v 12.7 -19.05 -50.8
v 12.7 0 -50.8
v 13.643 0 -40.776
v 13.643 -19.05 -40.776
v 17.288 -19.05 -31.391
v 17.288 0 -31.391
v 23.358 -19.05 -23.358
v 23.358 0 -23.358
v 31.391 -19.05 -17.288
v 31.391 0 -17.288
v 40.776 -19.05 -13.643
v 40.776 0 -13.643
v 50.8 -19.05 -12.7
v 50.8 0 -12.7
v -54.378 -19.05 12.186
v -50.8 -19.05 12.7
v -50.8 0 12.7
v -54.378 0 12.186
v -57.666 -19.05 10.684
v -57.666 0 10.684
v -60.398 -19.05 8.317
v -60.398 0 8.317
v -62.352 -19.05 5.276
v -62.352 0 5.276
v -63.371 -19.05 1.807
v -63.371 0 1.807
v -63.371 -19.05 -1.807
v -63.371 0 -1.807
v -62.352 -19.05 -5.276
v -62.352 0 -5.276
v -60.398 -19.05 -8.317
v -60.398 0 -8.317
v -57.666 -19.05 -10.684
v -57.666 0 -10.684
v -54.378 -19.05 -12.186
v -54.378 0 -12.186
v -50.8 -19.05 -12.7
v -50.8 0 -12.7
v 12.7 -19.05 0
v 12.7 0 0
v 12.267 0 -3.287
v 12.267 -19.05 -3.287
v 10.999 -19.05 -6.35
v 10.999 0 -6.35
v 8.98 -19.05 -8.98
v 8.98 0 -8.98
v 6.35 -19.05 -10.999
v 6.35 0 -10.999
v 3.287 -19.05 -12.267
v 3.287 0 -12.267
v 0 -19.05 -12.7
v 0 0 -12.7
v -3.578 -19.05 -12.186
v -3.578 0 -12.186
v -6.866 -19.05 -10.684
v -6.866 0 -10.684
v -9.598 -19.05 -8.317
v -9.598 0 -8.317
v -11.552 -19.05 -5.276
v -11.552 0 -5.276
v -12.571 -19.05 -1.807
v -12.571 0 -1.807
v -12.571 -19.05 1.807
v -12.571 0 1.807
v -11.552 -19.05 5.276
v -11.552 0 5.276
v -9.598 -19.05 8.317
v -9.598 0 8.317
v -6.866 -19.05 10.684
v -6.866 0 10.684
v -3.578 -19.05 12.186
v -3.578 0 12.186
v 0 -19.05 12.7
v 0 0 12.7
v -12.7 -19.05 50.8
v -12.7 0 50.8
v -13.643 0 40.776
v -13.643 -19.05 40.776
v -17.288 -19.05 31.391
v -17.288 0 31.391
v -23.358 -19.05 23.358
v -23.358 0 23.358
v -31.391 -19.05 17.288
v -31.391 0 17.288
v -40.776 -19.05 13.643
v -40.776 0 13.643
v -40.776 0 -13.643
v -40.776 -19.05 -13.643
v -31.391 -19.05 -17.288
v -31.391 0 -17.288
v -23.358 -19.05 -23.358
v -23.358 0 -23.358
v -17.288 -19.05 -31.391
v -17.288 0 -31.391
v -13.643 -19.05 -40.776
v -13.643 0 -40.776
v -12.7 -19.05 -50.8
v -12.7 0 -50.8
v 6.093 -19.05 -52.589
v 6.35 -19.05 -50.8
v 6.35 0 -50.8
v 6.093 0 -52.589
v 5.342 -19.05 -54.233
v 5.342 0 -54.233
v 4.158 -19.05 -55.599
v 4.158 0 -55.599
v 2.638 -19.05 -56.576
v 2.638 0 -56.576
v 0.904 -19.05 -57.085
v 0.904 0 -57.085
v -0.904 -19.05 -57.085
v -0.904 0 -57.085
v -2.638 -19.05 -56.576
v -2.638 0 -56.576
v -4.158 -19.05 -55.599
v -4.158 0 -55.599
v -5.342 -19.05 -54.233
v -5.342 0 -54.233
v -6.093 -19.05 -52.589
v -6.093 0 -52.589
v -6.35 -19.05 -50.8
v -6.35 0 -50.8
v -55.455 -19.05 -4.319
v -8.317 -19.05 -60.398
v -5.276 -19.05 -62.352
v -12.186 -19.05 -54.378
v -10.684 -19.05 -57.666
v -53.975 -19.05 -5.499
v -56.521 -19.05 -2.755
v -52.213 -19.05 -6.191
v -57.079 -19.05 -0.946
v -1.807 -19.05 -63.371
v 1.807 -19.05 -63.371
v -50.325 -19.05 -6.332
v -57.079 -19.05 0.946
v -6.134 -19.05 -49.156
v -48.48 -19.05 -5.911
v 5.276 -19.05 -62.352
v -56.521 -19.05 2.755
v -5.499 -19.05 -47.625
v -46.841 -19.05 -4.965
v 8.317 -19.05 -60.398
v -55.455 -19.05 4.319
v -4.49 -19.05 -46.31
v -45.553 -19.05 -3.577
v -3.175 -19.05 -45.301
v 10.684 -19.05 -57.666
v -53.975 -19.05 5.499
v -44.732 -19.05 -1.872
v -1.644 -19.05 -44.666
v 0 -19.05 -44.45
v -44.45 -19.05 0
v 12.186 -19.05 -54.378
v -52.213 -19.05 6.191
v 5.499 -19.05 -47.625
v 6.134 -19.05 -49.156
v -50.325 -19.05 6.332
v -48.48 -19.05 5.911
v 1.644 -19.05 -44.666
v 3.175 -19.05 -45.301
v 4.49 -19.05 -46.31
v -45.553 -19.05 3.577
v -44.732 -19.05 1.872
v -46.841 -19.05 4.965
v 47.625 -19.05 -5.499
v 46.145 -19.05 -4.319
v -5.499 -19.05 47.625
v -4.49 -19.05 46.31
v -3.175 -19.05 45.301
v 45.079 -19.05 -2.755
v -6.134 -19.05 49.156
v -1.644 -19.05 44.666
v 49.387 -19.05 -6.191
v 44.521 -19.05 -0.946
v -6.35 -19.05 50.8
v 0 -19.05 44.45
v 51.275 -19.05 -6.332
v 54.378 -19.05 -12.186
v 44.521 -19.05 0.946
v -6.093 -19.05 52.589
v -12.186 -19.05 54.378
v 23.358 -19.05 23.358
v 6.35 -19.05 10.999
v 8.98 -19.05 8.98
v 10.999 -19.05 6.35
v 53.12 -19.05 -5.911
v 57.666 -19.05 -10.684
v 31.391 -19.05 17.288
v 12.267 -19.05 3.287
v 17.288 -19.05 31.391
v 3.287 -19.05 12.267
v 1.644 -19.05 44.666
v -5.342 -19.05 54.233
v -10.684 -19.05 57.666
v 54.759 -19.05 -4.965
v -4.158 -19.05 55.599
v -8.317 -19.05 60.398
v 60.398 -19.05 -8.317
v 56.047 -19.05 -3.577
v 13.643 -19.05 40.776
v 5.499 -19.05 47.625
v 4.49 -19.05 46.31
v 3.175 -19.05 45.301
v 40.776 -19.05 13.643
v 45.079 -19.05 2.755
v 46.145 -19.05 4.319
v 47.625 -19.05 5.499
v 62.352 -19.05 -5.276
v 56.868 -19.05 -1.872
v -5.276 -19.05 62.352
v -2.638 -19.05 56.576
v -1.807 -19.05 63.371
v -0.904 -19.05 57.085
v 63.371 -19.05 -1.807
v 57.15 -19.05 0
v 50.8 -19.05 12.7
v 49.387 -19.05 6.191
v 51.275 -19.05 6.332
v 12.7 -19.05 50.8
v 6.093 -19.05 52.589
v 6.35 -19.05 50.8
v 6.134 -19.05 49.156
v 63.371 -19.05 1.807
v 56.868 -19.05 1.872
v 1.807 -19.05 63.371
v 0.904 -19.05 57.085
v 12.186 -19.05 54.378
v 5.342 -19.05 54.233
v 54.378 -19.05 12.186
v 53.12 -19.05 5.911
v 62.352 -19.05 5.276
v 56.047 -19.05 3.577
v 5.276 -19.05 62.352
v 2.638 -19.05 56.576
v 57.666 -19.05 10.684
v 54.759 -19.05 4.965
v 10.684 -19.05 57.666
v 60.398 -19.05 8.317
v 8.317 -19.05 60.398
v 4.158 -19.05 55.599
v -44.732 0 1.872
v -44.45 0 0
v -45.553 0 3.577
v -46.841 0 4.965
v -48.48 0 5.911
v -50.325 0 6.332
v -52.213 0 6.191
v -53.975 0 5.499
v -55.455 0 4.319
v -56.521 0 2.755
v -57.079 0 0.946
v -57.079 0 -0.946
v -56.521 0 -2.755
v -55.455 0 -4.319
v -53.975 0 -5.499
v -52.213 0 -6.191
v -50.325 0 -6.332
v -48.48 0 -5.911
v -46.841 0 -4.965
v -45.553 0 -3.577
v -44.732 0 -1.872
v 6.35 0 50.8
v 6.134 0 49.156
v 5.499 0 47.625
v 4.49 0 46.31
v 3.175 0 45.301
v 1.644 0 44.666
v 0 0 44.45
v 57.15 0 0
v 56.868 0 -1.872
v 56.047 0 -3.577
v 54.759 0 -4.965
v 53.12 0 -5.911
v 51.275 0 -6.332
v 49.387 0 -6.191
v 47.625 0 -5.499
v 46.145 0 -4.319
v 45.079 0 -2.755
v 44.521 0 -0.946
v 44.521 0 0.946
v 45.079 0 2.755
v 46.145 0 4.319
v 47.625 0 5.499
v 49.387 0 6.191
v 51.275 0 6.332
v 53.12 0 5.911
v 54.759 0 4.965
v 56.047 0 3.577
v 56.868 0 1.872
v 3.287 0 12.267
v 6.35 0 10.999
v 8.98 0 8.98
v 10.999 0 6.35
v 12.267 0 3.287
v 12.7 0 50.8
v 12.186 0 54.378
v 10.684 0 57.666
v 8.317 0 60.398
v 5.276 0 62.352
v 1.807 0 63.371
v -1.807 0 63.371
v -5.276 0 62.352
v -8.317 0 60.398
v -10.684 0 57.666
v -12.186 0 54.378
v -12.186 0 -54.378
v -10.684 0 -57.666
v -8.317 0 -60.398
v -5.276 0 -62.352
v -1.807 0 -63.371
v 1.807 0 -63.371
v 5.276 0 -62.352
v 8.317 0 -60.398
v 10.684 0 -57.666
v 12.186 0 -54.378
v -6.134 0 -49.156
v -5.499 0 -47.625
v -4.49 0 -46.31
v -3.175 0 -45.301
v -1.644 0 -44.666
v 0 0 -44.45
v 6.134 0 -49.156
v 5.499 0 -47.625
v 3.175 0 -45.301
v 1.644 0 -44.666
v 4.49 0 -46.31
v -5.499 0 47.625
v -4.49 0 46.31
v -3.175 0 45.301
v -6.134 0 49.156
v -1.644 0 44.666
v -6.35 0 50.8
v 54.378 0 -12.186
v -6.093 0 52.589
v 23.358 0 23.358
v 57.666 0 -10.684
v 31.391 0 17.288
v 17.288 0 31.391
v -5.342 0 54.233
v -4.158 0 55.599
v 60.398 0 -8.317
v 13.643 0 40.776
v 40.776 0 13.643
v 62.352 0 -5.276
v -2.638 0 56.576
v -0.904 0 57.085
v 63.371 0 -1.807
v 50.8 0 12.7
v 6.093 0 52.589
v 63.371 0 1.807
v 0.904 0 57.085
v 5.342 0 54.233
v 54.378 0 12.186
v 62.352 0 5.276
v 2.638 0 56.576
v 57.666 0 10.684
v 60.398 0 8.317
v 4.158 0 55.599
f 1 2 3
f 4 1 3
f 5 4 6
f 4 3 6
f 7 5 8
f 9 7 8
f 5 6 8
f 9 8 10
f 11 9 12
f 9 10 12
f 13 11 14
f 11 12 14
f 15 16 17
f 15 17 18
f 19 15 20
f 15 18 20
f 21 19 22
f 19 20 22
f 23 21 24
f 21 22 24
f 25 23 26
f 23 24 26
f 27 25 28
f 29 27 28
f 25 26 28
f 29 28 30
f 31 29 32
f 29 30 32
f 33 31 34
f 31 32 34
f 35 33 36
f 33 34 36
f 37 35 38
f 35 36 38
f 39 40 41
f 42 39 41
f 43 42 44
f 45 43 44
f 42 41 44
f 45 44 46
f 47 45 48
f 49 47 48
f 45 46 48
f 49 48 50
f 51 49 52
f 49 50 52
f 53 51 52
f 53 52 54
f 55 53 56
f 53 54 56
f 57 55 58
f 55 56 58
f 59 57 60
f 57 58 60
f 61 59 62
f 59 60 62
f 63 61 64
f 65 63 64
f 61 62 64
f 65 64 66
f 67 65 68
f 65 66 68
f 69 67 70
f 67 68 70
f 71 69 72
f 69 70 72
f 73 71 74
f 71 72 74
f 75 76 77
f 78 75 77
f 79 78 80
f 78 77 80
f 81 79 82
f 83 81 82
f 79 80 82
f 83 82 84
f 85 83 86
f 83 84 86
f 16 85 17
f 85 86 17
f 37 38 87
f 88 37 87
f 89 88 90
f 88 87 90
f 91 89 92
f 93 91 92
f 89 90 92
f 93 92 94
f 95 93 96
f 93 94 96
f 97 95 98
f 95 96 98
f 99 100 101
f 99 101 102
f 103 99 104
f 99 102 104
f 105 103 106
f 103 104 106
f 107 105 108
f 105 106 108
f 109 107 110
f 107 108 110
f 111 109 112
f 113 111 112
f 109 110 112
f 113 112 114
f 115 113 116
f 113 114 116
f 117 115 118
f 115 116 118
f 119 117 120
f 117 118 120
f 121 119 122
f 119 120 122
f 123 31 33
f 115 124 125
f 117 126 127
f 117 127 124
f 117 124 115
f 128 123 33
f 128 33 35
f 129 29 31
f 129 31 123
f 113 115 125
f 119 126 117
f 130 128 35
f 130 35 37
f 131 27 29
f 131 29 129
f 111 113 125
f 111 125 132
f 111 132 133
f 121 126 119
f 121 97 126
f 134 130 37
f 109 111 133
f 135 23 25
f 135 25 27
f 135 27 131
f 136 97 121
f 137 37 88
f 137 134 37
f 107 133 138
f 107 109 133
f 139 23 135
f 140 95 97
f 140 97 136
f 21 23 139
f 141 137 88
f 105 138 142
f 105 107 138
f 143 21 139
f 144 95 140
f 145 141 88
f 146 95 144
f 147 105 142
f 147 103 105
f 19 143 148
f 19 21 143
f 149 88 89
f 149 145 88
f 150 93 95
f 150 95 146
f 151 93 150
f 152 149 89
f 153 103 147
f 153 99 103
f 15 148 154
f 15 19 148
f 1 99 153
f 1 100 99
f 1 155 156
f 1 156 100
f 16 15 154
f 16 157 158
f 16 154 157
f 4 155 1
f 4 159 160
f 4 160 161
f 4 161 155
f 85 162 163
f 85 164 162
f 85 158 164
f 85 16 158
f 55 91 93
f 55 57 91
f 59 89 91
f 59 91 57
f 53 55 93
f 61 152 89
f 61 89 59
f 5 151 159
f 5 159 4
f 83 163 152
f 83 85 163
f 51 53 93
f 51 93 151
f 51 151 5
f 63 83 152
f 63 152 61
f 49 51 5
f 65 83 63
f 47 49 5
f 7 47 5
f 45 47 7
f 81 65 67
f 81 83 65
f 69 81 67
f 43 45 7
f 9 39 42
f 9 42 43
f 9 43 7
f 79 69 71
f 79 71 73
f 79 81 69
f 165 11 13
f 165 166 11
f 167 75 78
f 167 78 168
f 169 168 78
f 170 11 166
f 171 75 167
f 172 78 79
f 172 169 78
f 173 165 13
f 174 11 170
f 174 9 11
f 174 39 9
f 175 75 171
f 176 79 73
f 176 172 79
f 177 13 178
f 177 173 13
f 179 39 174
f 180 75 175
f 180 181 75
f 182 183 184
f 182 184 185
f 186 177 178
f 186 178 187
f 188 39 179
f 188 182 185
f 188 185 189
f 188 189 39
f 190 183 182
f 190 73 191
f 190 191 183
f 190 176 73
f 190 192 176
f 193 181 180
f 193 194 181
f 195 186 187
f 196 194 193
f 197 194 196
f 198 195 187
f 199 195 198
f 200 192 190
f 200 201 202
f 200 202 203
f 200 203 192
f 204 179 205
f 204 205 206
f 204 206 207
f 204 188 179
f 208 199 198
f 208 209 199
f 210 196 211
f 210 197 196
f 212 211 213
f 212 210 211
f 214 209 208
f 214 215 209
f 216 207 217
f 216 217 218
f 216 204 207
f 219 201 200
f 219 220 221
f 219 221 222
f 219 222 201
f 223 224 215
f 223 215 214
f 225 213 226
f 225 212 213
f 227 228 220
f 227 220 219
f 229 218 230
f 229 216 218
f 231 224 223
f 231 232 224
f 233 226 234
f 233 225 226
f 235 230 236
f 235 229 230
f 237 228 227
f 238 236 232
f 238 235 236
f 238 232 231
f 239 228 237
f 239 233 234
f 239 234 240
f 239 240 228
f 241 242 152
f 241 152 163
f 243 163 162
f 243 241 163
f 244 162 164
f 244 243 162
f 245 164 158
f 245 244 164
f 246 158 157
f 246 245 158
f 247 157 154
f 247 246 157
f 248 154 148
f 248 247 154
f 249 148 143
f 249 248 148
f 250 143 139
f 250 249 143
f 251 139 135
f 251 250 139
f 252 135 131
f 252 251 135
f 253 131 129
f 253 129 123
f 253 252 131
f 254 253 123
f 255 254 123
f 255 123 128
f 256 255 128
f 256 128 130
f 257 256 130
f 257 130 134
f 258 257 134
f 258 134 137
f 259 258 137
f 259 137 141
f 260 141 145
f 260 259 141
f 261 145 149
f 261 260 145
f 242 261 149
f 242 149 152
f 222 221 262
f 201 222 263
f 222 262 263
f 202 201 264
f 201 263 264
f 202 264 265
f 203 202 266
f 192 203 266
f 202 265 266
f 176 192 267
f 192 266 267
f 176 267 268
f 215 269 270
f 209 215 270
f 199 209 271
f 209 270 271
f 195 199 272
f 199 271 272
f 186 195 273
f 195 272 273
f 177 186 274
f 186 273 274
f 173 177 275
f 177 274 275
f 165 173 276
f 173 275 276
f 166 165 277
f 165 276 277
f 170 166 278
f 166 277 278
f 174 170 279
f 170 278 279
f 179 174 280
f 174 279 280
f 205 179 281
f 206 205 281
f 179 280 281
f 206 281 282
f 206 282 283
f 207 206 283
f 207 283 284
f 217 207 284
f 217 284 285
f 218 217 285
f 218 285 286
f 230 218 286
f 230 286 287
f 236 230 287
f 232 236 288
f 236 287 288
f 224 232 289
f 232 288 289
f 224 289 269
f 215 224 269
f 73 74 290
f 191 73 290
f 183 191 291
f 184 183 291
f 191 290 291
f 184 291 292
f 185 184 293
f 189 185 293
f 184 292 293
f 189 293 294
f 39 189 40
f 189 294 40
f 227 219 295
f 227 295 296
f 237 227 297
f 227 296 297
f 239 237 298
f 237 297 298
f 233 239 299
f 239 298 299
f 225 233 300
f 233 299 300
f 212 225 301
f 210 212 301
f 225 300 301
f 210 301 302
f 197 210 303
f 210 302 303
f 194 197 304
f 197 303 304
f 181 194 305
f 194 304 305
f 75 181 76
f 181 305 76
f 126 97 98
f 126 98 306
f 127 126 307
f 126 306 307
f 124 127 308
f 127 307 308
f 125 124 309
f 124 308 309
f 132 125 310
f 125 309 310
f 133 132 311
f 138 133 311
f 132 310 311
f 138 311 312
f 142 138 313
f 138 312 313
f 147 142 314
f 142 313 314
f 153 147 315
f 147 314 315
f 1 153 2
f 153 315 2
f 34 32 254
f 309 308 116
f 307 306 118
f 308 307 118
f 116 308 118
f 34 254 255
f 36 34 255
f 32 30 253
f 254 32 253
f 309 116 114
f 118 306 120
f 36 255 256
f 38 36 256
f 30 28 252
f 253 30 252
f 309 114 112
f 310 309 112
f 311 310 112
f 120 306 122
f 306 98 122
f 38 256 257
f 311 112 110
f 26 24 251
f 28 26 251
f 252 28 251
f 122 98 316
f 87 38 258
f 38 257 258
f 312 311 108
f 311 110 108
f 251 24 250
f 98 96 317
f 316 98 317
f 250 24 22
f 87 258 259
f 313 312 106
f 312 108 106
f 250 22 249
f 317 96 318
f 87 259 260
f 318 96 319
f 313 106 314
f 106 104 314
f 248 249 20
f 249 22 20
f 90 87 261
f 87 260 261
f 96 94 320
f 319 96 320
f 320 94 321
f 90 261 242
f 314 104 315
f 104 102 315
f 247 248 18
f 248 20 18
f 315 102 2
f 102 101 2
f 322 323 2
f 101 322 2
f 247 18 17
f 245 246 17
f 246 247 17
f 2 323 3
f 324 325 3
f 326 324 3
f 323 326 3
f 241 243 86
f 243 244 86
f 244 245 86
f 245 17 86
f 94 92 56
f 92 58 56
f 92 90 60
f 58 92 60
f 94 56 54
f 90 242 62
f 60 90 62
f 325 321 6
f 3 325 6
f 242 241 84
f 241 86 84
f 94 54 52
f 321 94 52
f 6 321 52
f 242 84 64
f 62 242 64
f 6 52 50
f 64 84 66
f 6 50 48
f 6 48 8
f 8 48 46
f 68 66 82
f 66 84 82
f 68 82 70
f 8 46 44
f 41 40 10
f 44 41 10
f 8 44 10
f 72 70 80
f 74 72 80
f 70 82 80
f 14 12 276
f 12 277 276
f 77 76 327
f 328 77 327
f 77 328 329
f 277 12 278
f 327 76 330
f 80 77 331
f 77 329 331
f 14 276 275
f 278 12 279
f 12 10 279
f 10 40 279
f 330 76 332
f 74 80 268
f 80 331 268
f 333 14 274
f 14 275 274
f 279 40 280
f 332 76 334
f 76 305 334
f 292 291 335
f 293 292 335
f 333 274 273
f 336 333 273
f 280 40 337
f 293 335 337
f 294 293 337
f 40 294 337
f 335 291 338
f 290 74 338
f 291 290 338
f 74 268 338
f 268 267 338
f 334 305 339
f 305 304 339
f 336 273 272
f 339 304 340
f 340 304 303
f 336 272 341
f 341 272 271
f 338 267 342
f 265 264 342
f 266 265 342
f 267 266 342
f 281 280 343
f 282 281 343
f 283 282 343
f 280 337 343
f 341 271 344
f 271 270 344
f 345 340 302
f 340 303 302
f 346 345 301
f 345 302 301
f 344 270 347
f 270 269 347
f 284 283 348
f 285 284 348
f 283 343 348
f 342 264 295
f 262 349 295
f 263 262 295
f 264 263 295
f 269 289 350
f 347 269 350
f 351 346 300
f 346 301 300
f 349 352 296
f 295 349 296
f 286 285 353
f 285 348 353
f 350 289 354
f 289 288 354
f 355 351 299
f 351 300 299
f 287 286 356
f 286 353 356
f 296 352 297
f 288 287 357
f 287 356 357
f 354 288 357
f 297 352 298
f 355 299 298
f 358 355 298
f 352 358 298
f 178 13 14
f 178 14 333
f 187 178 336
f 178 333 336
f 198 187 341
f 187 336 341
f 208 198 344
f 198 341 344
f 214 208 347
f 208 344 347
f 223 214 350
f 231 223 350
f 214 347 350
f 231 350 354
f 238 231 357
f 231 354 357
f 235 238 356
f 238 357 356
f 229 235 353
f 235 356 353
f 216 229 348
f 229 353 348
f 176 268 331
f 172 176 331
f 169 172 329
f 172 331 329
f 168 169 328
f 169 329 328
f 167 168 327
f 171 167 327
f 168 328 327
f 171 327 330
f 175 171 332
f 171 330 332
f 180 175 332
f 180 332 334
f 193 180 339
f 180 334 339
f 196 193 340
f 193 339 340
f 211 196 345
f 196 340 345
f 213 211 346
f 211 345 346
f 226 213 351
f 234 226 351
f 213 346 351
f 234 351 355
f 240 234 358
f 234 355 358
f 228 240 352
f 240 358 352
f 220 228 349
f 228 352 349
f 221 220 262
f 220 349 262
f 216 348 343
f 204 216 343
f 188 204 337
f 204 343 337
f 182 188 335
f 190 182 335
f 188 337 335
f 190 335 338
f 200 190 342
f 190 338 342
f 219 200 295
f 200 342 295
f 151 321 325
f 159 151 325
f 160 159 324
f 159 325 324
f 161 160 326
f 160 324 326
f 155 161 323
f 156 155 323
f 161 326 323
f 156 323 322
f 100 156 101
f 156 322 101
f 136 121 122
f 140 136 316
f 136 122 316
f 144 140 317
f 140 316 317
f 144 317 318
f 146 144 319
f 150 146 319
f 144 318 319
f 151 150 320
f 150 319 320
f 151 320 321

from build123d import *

# Parameters (mm, degrees)
F0_R     = 6.35
F1_DEPTH = 19.05


with BuildPart() as f1:
    # F0 (on Front) → F1 (new body)
    with BuildSketch(Plane.XZ):
        with Locations((-50.8, 0)):
            Circle(F0_R)
        with BuildLine():
            ThreePointArc((44.45, 0), (50.8, -6.35), (57.15, 0))
            ThreePointArc((57.15, 0), (50.8, 6.35), (44.45, 0))
        make_face()
        with BuildLine():
            ThreePointArc((-12.7, 50.8), (-23.358147, 23.358147), (-50.8, 12.7))
            ThreePointArc((-50.8, 12.7), (-63.5, 0), (-50.8, -12.7))
            ThreePointArc((-50.8, -12.7), (-23.358147, -23.358147), (-12.7, -50.8))
            ThreePointArc((-12.7, -50.8), (0, -63.5), (12.7, -50.8))
            ThreePointArc((12.7, -50.8), (23.358147, -23.358147), (50.8, -12.7))
            ThreePointArc((50.8, -12.7), (63.5, 0), (50.8, 12.7))
            ThreePointArc((50.8, 12.7), (23.358147, 23.358147), (12.7, 50.8))
            ThreePointArc((12.7, 50.8), (0, 63.5), (-12.7, 50.8))
        make_face()
        with BuildLine():
            ThreePointArc((-6.35, -50.8), (-4.490128, -46.309872), (0, -44.45))
            ThreePointArc((0, -44.45), (4.490128, -46.309872), (6.35, -50.8))
            ThreePointArc((6.35, -50.8), (0, -57.15), (-6.35, -50.8))
        make_face(mode=Mode.SUBTRACT)
        with Locations((-50.8, 0)):
            Circle(F0_R, mode=Mode.SUBTRACT)
        with BuildLine():
            ThreePointArc((0, 12.7), (8.980256, 8.980256), (12.7, 0))
            ThreePointArc((12.7, 0), (8.980256, -8.980256), (0, -12.7))
            ThreePointArc((0, -12.7), (-12.7, 0), (0, 12.7))
        make_face(mode=Mode.SUBTRACT)
        with BuildLine():
            ThreePointArc((44.45, 0), (50.8, 6.35), (57.15, 0))
            ThreePointArc((57.15, 0), (50.8, -6.35), (44.45, 0))
        make_face(mode=Mode.SUBTRACT)
        with BuildLine():
            ThreePointArc((6.35, 50.8), (4.490128, 46.309872), (0, 44.45))
            ThreePointArc((0, 44.45), (-4.490128, 46.309872), (-6.35, 50.8))
            ThreePointArc((-6.35, 50.8), (0, 57.15), (6.35, 50.8))
        make_face(mode=Mode.SUBTRACT)
    extrude(amount=F1_DEPTH)


solid = f1.part
